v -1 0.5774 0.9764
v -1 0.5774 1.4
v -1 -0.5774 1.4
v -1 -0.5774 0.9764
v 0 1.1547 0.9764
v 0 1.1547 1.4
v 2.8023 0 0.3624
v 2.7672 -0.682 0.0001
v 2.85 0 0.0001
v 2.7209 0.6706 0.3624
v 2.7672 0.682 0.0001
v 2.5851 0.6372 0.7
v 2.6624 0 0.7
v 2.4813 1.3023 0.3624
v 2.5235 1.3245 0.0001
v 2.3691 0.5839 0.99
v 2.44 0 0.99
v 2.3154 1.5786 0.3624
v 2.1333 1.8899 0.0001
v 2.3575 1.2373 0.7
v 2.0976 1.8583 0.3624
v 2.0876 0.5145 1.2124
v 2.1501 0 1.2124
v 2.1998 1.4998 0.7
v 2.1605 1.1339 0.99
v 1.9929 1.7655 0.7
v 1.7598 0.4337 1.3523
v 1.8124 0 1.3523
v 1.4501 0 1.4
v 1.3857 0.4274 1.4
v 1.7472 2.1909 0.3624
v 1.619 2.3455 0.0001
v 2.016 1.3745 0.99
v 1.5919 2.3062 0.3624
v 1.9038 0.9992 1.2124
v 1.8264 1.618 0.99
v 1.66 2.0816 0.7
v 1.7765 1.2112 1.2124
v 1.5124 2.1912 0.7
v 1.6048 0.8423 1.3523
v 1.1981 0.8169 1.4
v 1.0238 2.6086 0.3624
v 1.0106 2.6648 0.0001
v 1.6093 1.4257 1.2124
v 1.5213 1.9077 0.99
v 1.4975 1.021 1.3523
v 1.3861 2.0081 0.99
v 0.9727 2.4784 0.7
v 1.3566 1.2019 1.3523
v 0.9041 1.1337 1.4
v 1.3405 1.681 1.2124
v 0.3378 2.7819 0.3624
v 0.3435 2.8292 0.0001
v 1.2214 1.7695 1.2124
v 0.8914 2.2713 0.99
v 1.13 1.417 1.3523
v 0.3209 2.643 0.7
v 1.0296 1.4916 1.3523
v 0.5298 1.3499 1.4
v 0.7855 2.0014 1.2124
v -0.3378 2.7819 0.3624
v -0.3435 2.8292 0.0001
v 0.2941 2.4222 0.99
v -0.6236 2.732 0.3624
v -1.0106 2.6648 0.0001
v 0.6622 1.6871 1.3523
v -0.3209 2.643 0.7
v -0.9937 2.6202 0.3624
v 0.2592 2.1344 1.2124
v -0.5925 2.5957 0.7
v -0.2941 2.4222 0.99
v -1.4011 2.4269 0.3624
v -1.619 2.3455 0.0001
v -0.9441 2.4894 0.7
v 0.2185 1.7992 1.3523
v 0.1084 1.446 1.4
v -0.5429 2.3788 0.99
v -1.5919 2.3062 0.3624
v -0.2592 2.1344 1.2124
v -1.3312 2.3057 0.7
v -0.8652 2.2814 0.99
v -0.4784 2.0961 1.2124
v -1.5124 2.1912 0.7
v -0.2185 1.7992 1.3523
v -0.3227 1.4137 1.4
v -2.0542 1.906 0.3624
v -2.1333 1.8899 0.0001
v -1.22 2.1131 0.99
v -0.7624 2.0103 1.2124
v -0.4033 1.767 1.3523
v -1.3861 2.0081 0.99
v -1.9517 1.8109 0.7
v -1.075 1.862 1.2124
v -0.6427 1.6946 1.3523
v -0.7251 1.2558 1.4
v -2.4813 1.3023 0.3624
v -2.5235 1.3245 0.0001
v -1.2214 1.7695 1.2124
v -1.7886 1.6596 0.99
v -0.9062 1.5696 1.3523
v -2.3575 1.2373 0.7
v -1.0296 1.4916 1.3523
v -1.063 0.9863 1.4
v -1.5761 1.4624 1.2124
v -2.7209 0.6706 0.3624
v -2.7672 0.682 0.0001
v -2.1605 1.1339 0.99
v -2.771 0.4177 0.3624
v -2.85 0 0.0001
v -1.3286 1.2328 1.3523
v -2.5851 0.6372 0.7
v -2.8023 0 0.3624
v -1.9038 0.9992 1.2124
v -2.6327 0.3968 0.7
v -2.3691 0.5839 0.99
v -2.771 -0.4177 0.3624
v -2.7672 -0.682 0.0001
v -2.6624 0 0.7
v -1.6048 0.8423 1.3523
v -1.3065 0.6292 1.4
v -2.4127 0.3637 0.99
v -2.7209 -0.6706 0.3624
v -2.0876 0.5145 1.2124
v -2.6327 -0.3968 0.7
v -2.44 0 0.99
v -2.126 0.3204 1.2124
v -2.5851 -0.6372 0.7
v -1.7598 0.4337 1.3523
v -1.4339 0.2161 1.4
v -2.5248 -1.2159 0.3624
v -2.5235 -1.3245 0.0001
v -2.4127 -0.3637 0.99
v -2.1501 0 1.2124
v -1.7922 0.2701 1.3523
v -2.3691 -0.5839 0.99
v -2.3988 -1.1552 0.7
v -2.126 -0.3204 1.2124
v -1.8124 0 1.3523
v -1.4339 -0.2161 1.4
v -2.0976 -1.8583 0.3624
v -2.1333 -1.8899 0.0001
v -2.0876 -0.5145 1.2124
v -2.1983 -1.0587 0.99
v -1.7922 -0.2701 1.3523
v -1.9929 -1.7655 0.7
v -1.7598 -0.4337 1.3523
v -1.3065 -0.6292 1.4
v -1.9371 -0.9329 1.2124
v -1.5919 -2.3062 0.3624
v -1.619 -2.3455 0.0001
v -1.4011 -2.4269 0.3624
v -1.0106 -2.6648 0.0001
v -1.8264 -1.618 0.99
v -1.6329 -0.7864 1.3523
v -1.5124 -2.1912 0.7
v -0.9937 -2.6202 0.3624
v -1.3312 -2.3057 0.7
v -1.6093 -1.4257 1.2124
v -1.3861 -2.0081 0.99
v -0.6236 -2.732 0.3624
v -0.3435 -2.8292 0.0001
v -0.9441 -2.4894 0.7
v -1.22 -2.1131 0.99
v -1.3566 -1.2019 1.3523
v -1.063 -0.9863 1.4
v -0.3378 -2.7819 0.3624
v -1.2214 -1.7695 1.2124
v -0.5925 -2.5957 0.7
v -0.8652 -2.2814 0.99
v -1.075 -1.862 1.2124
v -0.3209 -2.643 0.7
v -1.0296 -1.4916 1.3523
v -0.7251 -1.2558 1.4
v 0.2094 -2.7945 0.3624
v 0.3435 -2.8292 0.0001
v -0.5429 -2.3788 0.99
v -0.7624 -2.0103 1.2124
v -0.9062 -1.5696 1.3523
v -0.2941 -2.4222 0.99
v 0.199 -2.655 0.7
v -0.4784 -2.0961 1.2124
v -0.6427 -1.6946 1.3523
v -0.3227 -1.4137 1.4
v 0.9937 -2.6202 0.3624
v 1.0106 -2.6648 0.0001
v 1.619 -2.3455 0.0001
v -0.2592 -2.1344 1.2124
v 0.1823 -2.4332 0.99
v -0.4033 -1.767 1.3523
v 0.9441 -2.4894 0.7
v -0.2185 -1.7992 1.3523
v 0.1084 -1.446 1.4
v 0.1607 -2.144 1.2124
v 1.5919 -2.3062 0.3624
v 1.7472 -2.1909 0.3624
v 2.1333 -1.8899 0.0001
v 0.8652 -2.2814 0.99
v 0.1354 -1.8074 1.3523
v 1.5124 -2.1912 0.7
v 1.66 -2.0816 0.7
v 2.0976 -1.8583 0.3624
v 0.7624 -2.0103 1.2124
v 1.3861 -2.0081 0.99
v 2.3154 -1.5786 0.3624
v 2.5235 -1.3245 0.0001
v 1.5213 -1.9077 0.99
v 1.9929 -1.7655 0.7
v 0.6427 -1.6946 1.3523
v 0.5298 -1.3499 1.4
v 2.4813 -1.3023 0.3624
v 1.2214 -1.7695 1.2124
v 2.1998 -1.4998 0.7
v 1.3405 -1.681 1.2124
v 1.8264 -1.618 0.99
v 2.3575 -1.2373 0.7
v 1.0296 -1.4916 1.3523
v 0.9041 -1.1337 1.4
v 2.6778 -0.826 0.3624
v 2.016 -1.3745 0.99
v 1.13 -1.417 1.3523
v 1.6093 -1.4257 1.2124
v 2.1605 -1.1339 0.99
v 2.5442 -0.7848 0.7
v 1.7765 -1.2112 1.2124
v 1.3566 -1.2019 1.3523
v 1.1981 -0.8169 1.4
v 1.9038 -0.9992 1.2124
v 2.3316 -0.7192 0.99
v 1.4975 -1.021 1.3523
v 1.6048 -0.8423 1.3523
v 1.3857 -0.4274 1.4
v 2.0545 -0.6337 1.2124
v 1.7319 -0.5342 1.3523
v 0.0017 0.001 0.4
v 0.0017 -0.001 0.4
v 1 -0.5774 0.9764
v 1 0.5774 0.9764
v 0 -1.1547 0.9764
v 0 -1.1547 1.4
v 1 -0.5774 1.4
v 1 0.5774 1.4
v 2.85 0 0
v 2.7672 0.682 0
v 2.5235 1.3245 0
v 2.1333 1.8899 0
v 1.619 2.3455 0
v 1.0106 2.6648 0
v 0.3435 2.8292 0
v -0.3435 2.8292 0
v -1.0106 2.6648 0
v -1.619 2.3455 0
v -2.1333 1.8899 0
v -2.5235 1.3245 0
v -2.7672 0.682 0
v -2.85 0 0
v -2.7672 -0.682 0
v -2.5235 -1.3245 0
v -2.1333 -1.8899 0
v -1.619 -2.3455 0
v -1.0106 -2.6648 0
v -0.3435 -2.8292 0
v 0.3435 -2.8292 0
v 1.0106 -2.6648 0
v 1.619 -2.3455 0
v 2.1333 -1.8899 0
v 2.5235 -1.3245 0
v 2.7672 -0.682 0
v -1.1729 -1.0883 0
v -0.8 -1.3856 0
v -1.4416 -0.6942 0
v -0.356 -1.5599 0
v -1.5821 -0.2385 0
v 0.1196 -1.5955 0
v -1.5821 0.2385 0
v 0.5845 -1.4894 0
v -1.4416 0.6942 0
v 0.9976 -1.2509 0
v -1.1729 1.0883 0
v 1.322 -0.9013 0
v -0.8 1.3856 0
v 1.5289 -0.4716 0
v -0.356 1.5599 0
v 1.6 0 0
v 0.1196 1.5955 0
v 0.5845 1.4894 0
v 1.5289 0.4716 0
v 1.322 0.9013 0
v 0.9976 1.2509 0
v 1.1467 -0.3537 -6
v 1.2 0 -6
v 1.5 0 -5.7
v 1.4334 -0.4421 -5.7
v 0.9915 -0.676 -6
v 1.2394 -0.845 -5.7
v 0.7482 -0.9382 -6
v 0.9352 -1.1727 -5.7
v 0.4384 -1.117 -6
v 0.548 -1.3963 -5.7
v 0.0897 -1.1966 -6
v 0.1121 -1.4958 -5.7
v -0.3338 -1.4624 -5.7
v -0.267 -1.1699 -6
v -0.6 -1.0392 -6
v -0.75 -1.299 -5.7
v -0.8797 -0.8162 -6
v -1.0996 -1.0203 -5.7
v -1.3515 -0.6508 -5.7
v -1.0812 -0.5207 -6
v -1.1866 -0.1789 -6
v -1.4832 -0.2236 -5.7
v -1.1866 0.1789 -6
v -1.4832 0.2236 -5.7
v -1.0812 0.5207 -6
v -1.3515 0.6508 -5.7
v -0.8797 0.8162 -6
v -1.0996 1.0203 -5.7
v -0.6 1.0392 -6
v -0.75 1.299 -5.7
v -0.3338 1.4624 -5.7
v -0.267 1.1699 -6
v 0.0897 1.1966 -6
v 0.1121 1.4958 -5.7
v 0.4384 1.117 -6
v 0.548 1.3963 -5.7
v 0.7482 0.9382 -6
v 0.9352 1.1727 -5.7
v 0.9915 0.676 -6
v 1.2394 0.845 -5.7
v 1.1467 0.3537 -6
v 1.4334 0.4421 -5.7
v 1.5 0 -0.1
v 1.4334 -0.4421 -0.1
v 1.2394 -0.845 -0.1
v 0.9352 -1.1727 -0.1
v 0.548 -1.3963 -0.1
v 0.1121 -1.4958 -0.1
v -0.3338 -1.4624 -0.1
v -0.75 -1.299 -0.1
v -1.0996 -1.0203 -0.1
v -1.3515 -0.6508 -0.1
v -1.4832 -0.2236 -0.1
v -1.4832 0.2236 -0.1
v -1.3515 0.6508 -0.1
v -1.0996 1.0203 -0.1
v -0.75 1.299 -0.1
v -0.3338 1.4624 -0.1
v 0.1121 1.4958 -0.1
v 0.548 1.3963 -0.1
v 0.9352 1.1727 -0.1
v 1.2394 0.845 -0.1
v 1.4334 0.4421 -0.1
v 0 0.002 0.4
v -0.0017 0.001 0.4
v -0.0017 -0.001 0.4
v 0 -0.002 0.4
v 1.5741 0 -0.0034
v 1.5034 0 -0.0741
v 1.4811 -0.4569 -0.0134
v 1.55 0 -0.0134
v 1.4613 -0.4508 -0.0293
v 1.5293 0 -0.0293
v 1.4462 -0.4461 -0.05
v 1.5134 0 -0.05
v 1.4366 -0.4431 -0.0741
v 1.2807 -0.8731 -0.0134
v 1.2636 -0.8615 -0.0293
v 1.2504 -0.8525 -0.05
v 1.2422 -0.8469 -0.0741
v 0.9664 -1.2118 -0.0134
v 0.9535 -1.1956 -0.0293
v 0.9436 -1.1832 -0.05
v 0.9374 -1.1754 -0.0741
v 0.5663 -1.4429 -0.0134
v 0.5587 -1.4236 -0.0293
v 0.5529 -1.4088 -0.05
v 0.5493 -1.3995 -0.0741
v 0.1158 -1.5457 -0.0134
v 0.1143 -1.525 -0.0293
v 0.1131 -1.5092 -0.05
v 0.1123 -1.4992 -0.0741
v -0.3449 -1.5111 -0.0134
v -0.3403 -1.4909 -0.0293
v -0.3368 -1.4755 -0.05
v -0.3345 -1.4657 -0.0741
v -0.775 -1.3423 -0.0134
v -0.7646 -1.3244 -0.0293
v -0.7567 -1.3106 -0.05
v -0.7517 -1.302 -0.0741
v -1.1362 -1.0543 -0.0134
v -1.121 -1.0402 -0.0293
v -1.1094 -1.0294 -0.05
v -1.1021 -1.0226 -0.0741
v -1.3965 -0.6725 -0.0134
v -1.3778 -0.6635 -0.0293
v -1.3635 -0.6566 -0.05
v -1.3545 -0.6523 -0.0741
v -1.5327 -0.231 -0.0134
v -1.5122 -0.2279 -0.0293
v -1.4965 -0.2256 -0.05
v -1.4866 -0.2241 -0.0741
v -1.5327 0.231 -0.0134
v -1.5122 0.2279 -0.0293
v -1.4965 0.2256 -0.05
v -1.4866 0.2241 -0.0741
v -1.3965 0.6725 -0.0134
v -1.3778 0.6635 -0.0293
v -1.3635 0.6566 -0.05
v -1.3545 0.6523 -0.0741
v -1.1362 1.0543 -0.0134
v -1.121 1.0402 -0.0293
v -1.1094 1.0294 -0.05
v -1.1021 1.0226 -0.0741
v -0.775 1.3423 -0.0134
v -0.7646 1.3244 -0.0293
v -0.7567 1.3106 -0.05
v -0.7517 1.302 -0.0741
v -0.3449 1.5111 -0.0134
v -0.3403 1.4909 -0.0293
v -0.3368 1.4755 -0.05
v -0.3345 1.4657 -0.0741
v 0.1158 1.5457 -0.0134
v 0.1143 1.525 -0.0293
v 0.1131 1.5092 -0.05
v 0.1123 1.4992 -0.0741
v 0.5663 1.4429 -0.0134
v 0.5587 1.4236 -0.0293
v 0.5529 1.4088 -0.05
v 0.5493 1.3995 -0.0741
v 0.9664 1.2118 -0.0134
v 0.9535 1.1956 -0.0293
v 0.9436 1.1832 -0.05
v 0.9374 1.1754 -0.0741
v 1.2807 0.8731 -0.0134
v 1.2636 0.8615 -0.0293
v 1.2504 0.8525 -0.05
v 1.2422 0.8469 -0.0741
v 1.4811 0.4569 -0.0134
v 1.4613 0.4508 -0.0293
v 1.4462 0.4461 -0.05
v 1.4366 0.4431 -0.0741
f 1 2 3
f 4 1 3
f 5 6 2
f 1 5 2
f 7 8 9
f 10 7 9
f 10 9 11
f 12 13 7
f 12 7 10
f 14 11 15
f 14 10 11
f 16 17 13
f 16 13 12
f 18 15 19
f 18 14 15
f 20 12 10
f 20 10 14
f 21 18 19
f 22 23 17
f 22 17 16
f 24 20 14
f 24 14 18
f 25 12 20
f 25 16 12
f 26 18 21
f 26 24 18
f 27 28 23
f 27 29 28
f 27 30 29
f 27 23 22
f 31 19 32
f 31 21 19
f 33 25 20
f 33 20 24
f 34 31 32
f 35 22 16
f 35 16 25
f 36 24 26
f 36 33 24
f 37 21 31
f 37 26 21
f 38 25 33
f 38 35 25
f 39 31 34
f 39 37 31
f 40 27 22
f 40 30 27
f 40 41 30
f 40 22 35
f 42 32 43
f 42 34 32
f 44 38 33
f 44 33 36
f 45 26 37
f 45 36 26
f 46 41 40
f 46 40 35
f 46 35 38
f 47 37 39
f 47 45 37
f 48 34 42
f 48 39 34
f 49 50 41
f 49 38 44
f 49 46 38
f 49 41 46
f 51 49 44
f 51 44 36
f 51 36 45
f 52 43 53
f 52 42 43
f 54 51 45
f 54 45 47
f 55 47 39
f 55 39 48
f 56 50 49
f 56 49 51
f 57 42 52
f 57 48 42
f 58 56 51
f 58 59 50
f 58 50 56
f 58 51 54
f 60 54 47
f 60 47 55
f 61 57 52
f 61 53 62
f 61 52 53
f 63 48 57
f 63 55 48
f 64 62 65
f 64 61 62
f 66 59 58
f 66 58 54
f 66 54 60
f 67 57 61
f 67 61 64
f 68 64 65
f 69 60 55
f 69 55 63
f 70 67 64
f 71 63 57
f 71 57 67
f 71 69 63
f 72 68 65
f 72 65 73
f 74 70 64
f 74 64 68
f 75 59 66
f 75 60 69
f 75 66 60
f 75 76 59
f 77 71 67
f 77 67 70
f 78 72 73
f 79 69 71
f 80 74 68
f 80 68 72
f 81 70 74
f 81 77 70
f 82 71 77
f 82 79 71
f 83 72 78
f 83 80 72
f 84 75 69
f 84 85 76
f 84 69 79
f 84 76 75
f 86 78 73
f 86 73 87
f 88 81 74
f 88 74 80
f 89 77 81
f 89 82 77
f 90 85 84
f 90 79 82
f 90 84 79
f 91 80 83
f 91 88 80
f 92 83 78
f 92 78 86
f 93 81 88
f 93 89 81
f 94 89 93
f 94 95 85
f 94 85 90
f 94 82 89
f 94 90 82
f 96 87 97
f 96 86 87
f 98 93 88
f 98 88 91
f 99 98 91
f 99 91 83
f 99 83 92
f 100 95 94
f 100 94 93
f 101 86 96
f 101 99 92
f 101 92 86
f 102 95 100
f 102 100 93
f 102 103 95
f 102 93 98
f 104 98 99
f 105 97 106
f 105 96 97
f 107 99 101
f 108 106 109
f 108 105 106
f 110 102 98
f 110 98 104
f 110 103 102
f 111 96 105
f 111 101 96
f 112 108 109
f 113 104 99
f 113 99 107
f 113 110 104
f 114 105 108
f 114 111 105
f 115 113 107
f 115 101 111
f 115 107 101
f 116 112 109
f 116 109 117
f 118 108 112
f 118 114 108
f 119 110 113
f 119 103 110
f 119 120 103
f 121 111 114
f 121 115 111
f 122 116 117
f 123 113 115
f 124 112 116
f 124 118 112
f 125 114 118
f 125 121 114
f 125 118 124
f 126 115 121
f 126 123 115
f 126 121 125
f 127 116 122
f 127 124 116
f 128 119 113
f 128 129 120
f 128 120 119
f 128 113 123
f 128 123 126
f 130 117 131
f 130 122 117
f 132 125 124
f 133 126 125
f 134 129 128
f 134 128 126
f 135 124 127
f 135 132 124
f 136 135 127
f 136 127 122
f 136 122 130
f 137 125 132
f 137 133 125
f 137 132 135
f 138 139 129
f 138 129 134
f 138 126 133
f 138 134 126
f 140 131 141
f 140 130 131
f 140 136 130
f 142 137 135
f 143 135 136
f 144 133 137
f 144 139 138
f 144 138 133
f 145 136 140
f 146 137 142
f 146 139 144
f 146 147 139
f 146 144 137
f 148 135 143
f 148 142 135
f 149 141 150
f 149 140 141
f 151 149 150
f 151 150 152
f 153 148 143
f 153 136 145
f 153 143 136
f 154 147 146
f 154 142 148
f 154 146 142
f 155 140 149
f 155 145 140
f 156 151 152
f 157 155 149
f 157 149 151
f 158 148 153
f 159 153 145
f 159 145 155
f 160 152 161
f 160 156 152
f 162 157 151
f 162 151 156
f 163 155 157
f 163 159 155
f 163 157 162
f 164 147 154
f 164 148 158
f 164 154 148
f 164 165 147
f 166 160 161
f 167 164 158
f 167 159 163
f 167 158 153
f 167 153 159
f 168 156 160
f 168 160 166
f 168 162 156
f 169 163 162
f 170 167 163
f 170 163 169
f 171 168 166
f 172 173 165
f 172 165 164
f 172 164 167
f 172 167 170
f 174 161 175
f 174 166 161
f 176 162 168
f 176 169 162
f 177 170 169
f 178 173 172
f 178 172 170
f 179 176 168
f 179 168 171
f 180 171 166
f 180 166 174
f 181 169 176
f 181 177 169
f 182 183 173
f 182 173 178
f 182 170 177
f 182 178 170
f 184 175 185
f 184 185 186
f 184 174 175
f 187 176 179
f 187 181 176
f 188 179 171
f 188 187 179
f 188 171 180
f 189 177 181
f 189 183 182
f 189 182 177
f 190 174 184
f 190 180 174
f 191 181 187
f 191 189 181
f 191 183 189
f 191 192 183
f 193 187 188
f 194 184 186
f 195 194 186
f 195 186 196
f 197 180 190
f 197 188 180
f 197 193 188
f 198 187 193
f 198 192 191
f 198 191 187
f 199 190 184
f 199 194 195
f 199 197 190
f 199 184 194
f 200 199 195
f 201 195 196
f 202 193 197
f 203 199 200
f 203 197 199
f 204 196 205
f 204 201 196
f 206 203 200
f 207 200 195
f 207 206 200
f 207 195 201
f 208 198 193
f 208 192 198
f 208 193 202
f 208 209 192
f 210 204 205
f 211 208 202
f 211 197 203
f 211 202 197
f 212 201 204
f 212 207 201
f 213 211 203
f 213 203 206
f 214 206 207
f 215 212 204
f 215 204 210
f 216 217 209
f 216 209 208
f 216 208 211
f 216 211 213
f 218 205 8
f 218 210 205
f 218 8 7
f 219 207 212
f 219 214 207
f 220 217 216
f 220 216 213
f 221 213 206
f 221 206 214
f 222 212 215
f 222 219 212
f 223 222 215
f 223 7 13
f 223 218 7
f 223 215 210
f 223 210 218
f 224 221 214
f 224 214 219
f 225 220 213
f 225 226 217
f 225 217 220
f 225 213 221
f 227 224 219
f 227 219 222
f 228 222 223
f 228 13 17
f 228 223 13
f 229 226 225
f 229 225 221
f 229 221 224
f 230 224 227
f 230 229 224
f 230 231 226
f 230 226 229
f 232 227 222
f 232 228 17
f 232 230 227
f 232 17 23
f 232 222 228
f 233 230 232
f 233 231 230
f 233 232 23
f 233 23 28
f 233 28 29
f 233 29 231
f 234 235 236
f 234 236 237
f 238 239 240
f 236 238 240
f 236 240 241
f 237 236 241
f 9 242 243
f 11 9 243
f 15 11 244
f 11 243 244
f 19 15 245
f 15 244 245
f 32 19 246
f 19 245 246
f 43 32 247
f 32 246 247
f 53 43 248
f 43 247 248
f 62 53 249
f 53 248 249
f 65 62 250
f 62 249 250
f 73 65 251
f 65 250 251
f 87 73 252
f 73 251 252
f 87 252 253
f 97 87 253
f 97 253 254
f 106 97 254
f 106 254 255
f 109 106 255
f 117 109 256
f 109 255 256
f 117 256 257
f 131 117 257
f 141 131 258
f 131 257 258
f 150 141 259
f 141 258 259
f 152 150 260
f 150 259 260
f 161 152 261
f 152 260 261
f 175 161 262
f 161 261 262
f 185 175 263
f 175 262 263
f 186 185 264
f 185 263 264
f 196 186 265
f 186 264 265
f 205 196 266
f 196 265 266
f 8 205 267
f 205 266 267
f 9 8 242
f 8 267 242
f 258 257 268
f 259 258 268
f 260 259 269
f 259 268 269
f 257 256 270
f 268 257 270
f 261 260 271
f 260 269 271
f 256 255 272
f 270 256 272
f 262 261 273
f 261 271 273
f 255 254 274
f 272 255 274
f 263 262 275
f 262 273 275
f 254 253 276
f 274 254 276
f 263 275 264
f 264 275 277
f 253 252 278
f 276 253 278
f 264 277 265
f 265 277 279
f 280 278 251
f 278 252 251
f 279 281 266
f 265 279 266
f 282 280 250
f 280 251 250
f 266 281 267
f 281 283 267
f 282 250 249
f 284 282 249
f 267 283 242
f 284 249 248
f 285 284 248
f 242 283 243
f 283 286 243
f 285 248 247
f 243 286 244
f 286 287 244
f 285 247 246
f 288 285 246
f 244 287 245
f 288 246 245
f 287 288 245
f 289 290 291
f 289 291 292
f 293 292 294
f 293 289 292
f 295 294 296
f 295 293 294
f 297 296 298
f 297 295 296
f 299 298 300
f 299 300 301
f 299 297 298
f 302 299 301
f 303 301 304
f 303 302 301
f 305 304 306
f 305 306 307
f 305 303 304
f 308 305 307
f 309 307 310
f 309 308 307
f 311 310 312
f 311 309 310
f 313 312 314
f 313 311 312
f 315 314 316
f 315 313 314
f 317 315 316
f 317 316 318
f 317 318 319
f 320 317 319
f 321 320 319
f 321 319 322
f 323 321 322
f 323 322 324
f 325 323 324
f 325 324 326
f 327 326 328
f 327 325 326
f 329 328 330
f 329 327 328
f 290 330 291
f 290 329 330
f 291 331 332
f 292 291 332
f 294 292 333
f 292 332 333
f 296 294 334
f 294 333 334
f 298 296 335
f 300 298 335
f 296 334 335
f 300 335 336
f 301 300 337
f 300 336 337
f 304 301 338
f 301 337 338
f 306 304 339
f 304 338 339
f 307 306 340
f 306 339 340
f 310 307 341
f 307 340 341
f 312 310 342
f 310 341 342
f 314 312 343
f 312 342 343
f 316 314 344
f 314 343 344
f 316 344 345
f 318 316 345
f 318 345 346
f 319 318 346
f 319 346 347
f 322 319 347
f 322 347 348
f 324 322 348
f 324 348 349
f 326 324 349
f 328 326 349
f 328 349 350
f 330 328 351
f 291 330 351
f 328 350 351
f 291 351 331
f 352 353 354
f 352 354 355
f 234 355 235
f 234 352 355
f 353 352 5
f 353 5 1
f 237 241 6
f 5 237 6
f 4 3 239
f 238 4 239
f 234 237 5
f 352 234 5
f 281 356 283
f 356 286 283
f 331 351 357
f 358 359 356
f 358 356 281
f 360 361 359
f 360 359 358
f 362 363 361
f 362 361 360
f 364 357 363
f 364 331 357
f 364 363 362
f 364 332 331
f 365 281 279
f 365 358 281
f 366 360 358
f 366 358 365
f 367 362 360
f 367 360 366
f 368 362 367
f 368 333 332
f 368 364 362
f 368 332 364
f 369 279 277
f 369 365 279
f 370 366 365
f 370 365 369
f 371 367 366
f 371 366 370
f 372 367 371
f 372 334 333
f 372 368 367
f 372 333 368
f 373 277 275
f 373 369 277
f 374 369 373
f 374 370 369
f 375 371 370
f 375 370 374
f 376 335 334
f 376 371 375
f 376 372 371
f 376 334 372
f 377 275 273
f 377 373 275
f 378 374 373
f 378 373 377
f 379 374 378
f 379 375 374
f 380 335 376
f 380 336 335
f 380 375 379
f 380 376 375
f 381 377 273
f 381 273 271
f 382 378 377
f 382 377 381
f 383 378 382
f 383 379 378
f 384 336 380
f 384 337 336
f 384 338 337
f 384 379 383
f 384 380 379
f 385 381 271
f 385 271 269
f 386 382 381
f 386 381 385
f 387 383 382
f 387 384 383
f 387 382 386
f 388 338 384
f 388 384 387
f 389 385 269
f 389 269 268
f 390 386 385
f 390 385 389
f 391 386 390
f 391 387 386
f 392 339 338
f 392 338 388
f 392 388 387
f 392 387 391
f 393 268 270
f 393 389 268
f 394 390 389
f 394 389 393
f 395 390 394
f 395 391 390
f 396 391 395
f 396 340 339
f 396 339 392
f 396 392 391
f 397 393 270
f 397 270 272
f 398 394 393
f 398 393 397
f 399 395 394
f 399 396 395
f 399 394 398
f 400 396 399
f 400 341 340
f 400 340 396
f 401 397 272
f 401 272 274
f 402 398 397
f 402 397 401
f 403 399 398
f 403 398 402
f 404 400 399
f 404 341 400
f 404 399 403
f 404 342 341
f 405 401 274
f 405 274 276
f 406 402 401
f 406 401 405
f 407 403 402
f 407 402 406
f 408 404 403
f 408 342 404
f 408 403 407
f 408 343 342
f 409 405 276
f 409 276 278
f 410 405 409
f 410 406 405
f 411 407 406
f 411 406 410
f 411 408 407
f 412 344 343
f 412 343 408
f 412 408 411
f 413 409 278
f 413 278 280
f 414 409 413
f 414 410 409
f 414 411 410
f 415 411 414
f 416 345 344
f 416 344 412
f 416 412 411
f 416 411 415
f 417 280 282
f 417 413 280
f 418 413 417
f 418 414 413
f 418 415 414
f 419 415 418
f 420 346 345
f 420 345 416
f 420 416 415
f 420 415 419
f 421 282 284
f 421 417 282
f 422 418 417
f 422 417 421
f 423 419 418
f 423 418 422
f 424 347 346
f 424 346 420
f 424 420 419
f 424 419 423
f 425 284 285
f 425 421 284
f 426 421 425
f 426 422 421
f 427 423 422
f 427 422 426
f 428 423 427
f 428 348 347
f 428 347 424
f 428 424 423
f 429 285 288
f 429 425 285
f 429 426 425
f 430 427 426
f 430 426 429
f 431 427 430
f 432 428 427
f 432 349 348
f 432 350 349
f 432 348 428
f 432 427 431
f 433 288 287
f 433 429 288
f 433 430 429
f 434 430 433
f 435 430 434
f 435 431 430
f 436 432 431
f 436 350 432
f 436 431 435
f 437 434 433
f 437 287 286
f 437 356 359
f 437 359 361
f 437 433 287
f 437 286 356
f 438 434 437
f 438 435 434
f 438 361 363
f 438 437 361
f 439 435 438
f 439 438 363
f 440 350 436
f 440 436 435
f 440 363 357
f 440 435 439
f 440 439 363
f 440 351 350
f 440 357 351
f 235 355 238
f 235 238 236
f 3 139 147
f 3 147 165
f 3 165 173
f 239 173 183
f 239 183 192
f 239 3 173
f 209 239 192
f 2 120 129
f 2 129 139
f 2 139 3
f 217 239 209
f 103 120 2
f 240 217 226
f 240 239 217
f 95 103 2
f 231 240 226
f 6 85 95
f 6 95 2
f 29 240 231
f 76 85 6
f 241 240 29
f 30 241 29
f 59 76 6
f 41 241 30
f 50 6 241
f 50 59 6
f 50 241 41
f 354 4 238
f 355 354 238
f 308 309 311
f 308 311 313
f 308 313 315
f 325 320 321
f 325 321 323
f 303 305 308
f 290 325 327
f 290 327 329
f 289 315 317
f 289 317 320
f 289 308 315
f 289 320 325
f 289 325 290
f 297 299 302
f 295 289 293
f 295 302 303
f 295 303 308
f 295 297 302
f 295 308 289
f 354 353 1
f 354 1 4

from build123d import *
from OCP.BRepFilletAPI import BRepFilletAPI_MakeChamfer

# Parameters (mm, degrees)
SKETCH_1_R          = 2.85
EXTRUDE_1_DEPTH     = 1.4
FILLET_1_R          = 1.4
SKETCH_3_R          = 1.5
EXTRUDE_3_DEPTH     = 6
CUT_EXTRUDE_1_DEPTH = 1
CHAMFER_2_SIZE      = 0.3
CHAMFER_3_SIZE      = 0.576368876
CHAMFER_3_SIZE2     = 0.998300177
FILLET_2_R          = 0.1


with BuildPart() as part:
    # 草图1 → 凸台-拉伸1 (new body)
    with BuildSketch(Plane.XY):
        Circle(SKETCH_1_R)
    extrude(amount=EXTRUDE_1_DEPTH)

    # 圆角1
    fillet_1_edges = [part.edges().sort_by_distance(p)[0] for p in [
        (-2.85, 0, 1.4),
    ]]
    fillet(fillet_1_edges, radius=FILLET_1_R - 0.0001)  # a hair under: the kernel refuses the full size

    # 草图3 → 凸台-拉伸3 (add)
    with BuildSketch(Plane(origin=(0, 0, 0), x_dir=(-1, 0, 0), z_dir=(0, 0, -1))):
        with Locations(Location((0, 0, 0), (0, 0, 180))):
            Circle(SKETCH_3_R)
    extrude(amount=EXTRUDE_3_DEPTH)

    # 草图4 → 切除-拉伸1 (cut)
    with BuildSketch(Plane.XY.offset(1.4)):
        Polygon((1, 0.577350269), (0, 1.154700538), (-1, 0.577350269), (-1, -0.577350269), (0, -1.154700538), (1, -0.577350269), align=None)
    extrude(amount=-CUT_EXTRUDE_1_DEPTH, mode=Mode.SUBTRACT)

    # 倒角2
    chamfer_2_edges = [part.edges().sort_by_distance(p)[0] for p in [
        (-1.5, 0, -6),
    ]]
    chamfer(chamfer_2_edges, length=CHAMFER_2_SIZE)

    # 倒角3: one chamfer whose edges measure the first distance from different faces: ONE call of the kernel's chamfer builder (chamfer() names one face for all edges)
    chamfer_3_edges_1 = [part.edges().sort_by_distance(p)[0] for p in [
        (1, 0, 0.4),
    ]]
    chamfer_3_side_1 = [part.faces().sort_by_distance(p)[0] for p in [
        (1, 0, 0.9),
    ]]
    chamfer_3_edges_2 = [part.edges().sort_by_distance(p)[0] for p in [
        (0.5, -0.866025404, 0.4),
    ]]
    chamfer_3_side_2 = [part.faces().sort_by_distance(p)[0] for p in [
        (0.5, -0.866025404, 0.9),
    ]]
    chamfer_3_edges_3 = [part.edges().sort_by_distance(p)[0] for p in [
        (-0.5, -0.866025404, 0.4),
    ]]
    chamfer_3_side_3 = [part.faces().sort_by_distance(p)[0] for p in [
        (-0.5, -0.866025404, 0.9),
    ]]
    chamfer_3_edges_4 = [part.edges().sort_by_distance(p)[0] for p in [
        (-1, 0, 0.4),
    ]]
    chamfer_3_side_4 = [part.faces().sort_by_distance(p)[0] for p in [
        (-1, 0, 0.9),
    ]]
    chamfer_3_edges_5 = [part.edges().sort_by_distance(p)[0] for p in [
        (-0.5, 0.866025404, 0.4),
    ]]
    chamfer_3_side_5 = [part.faces().sort_by_distance(p)[0] for p in [
        (-0.5, 0.866025404, 0.9),
    ]]
    chamfer_3_edges_6 = [part.edges().sort_by_distance(p)[0] for p in [
        (0.5, 0.866025404, 0.4),
    ]]
    chamfer_3_side_6 = [part.faces().sort_by_distance(p)[0] for p in [
        (0.5, 0.866025404, 0.9),
    ]]
    chamfer_3 = BRepFilletAPI_MakeChamfer(part.part.solid().wrapped)
    for e in chamfer_3_edges_1:
        chamfer_3.Add(CHAMFER_3_SIZE, CHAMFER_3_SIZE2, e.wrapped, chamfer_3_side_1[0].wrapped)  # the first distance lies on this face
    for e in chamfer_3_edges_2:
        chamfer_3.Add(CHAMFER_3_SIZE, CHAMFER_3_SIZE2, e.wrapped, chamfer_3_side_2[0].wrapped)  # the first distance lies on this face
    for e in chamfer_3_edges_3:
        chamfer_3.Add(CHAMFER_3_SIZE, CHAMFER_3_SIZE2, e.wrapped, chamfer_3_side_3[0].wrapped)  # the first distance lies on this face
    for e in chamfer_3_edges_4:
        chamfer_3.Add(CHAMFER_3_SIZE, CHAMFER_3_SIZE2, e.wrapped, chamfer_3_side_4[0].wrapped)  # the first distance lies on this face
    for e in chamfer_3_edges_5:
        chamfer_3.Add(CHAMFER_3_SIZE, CHAMFER_3_SIZE2, e.wrapped, chamfer_3_side_5[0].wrapped)  # the first distance lies on this face
    for e in chamfer_3_edges_6:
        chamfer_3.Add(CHAMFER_3_SIZE, CHAMFER_3_SIZE2, e.wrapped, chamfer_3_side_6[0].wrapped)  # the first distance lies on this face
    add(Compound.cast(chamfer_3.Shape()), mode=Mode.REPLACE)

    # 圆角2
    fillet_2_edges = [part.edges().sort_by_distance(p)[0] for p in [
        (-1.5, 0, 0),
    ]]
    fillet(fillet_2_edges, radius=FILLET_2_R)


solid = part.part
